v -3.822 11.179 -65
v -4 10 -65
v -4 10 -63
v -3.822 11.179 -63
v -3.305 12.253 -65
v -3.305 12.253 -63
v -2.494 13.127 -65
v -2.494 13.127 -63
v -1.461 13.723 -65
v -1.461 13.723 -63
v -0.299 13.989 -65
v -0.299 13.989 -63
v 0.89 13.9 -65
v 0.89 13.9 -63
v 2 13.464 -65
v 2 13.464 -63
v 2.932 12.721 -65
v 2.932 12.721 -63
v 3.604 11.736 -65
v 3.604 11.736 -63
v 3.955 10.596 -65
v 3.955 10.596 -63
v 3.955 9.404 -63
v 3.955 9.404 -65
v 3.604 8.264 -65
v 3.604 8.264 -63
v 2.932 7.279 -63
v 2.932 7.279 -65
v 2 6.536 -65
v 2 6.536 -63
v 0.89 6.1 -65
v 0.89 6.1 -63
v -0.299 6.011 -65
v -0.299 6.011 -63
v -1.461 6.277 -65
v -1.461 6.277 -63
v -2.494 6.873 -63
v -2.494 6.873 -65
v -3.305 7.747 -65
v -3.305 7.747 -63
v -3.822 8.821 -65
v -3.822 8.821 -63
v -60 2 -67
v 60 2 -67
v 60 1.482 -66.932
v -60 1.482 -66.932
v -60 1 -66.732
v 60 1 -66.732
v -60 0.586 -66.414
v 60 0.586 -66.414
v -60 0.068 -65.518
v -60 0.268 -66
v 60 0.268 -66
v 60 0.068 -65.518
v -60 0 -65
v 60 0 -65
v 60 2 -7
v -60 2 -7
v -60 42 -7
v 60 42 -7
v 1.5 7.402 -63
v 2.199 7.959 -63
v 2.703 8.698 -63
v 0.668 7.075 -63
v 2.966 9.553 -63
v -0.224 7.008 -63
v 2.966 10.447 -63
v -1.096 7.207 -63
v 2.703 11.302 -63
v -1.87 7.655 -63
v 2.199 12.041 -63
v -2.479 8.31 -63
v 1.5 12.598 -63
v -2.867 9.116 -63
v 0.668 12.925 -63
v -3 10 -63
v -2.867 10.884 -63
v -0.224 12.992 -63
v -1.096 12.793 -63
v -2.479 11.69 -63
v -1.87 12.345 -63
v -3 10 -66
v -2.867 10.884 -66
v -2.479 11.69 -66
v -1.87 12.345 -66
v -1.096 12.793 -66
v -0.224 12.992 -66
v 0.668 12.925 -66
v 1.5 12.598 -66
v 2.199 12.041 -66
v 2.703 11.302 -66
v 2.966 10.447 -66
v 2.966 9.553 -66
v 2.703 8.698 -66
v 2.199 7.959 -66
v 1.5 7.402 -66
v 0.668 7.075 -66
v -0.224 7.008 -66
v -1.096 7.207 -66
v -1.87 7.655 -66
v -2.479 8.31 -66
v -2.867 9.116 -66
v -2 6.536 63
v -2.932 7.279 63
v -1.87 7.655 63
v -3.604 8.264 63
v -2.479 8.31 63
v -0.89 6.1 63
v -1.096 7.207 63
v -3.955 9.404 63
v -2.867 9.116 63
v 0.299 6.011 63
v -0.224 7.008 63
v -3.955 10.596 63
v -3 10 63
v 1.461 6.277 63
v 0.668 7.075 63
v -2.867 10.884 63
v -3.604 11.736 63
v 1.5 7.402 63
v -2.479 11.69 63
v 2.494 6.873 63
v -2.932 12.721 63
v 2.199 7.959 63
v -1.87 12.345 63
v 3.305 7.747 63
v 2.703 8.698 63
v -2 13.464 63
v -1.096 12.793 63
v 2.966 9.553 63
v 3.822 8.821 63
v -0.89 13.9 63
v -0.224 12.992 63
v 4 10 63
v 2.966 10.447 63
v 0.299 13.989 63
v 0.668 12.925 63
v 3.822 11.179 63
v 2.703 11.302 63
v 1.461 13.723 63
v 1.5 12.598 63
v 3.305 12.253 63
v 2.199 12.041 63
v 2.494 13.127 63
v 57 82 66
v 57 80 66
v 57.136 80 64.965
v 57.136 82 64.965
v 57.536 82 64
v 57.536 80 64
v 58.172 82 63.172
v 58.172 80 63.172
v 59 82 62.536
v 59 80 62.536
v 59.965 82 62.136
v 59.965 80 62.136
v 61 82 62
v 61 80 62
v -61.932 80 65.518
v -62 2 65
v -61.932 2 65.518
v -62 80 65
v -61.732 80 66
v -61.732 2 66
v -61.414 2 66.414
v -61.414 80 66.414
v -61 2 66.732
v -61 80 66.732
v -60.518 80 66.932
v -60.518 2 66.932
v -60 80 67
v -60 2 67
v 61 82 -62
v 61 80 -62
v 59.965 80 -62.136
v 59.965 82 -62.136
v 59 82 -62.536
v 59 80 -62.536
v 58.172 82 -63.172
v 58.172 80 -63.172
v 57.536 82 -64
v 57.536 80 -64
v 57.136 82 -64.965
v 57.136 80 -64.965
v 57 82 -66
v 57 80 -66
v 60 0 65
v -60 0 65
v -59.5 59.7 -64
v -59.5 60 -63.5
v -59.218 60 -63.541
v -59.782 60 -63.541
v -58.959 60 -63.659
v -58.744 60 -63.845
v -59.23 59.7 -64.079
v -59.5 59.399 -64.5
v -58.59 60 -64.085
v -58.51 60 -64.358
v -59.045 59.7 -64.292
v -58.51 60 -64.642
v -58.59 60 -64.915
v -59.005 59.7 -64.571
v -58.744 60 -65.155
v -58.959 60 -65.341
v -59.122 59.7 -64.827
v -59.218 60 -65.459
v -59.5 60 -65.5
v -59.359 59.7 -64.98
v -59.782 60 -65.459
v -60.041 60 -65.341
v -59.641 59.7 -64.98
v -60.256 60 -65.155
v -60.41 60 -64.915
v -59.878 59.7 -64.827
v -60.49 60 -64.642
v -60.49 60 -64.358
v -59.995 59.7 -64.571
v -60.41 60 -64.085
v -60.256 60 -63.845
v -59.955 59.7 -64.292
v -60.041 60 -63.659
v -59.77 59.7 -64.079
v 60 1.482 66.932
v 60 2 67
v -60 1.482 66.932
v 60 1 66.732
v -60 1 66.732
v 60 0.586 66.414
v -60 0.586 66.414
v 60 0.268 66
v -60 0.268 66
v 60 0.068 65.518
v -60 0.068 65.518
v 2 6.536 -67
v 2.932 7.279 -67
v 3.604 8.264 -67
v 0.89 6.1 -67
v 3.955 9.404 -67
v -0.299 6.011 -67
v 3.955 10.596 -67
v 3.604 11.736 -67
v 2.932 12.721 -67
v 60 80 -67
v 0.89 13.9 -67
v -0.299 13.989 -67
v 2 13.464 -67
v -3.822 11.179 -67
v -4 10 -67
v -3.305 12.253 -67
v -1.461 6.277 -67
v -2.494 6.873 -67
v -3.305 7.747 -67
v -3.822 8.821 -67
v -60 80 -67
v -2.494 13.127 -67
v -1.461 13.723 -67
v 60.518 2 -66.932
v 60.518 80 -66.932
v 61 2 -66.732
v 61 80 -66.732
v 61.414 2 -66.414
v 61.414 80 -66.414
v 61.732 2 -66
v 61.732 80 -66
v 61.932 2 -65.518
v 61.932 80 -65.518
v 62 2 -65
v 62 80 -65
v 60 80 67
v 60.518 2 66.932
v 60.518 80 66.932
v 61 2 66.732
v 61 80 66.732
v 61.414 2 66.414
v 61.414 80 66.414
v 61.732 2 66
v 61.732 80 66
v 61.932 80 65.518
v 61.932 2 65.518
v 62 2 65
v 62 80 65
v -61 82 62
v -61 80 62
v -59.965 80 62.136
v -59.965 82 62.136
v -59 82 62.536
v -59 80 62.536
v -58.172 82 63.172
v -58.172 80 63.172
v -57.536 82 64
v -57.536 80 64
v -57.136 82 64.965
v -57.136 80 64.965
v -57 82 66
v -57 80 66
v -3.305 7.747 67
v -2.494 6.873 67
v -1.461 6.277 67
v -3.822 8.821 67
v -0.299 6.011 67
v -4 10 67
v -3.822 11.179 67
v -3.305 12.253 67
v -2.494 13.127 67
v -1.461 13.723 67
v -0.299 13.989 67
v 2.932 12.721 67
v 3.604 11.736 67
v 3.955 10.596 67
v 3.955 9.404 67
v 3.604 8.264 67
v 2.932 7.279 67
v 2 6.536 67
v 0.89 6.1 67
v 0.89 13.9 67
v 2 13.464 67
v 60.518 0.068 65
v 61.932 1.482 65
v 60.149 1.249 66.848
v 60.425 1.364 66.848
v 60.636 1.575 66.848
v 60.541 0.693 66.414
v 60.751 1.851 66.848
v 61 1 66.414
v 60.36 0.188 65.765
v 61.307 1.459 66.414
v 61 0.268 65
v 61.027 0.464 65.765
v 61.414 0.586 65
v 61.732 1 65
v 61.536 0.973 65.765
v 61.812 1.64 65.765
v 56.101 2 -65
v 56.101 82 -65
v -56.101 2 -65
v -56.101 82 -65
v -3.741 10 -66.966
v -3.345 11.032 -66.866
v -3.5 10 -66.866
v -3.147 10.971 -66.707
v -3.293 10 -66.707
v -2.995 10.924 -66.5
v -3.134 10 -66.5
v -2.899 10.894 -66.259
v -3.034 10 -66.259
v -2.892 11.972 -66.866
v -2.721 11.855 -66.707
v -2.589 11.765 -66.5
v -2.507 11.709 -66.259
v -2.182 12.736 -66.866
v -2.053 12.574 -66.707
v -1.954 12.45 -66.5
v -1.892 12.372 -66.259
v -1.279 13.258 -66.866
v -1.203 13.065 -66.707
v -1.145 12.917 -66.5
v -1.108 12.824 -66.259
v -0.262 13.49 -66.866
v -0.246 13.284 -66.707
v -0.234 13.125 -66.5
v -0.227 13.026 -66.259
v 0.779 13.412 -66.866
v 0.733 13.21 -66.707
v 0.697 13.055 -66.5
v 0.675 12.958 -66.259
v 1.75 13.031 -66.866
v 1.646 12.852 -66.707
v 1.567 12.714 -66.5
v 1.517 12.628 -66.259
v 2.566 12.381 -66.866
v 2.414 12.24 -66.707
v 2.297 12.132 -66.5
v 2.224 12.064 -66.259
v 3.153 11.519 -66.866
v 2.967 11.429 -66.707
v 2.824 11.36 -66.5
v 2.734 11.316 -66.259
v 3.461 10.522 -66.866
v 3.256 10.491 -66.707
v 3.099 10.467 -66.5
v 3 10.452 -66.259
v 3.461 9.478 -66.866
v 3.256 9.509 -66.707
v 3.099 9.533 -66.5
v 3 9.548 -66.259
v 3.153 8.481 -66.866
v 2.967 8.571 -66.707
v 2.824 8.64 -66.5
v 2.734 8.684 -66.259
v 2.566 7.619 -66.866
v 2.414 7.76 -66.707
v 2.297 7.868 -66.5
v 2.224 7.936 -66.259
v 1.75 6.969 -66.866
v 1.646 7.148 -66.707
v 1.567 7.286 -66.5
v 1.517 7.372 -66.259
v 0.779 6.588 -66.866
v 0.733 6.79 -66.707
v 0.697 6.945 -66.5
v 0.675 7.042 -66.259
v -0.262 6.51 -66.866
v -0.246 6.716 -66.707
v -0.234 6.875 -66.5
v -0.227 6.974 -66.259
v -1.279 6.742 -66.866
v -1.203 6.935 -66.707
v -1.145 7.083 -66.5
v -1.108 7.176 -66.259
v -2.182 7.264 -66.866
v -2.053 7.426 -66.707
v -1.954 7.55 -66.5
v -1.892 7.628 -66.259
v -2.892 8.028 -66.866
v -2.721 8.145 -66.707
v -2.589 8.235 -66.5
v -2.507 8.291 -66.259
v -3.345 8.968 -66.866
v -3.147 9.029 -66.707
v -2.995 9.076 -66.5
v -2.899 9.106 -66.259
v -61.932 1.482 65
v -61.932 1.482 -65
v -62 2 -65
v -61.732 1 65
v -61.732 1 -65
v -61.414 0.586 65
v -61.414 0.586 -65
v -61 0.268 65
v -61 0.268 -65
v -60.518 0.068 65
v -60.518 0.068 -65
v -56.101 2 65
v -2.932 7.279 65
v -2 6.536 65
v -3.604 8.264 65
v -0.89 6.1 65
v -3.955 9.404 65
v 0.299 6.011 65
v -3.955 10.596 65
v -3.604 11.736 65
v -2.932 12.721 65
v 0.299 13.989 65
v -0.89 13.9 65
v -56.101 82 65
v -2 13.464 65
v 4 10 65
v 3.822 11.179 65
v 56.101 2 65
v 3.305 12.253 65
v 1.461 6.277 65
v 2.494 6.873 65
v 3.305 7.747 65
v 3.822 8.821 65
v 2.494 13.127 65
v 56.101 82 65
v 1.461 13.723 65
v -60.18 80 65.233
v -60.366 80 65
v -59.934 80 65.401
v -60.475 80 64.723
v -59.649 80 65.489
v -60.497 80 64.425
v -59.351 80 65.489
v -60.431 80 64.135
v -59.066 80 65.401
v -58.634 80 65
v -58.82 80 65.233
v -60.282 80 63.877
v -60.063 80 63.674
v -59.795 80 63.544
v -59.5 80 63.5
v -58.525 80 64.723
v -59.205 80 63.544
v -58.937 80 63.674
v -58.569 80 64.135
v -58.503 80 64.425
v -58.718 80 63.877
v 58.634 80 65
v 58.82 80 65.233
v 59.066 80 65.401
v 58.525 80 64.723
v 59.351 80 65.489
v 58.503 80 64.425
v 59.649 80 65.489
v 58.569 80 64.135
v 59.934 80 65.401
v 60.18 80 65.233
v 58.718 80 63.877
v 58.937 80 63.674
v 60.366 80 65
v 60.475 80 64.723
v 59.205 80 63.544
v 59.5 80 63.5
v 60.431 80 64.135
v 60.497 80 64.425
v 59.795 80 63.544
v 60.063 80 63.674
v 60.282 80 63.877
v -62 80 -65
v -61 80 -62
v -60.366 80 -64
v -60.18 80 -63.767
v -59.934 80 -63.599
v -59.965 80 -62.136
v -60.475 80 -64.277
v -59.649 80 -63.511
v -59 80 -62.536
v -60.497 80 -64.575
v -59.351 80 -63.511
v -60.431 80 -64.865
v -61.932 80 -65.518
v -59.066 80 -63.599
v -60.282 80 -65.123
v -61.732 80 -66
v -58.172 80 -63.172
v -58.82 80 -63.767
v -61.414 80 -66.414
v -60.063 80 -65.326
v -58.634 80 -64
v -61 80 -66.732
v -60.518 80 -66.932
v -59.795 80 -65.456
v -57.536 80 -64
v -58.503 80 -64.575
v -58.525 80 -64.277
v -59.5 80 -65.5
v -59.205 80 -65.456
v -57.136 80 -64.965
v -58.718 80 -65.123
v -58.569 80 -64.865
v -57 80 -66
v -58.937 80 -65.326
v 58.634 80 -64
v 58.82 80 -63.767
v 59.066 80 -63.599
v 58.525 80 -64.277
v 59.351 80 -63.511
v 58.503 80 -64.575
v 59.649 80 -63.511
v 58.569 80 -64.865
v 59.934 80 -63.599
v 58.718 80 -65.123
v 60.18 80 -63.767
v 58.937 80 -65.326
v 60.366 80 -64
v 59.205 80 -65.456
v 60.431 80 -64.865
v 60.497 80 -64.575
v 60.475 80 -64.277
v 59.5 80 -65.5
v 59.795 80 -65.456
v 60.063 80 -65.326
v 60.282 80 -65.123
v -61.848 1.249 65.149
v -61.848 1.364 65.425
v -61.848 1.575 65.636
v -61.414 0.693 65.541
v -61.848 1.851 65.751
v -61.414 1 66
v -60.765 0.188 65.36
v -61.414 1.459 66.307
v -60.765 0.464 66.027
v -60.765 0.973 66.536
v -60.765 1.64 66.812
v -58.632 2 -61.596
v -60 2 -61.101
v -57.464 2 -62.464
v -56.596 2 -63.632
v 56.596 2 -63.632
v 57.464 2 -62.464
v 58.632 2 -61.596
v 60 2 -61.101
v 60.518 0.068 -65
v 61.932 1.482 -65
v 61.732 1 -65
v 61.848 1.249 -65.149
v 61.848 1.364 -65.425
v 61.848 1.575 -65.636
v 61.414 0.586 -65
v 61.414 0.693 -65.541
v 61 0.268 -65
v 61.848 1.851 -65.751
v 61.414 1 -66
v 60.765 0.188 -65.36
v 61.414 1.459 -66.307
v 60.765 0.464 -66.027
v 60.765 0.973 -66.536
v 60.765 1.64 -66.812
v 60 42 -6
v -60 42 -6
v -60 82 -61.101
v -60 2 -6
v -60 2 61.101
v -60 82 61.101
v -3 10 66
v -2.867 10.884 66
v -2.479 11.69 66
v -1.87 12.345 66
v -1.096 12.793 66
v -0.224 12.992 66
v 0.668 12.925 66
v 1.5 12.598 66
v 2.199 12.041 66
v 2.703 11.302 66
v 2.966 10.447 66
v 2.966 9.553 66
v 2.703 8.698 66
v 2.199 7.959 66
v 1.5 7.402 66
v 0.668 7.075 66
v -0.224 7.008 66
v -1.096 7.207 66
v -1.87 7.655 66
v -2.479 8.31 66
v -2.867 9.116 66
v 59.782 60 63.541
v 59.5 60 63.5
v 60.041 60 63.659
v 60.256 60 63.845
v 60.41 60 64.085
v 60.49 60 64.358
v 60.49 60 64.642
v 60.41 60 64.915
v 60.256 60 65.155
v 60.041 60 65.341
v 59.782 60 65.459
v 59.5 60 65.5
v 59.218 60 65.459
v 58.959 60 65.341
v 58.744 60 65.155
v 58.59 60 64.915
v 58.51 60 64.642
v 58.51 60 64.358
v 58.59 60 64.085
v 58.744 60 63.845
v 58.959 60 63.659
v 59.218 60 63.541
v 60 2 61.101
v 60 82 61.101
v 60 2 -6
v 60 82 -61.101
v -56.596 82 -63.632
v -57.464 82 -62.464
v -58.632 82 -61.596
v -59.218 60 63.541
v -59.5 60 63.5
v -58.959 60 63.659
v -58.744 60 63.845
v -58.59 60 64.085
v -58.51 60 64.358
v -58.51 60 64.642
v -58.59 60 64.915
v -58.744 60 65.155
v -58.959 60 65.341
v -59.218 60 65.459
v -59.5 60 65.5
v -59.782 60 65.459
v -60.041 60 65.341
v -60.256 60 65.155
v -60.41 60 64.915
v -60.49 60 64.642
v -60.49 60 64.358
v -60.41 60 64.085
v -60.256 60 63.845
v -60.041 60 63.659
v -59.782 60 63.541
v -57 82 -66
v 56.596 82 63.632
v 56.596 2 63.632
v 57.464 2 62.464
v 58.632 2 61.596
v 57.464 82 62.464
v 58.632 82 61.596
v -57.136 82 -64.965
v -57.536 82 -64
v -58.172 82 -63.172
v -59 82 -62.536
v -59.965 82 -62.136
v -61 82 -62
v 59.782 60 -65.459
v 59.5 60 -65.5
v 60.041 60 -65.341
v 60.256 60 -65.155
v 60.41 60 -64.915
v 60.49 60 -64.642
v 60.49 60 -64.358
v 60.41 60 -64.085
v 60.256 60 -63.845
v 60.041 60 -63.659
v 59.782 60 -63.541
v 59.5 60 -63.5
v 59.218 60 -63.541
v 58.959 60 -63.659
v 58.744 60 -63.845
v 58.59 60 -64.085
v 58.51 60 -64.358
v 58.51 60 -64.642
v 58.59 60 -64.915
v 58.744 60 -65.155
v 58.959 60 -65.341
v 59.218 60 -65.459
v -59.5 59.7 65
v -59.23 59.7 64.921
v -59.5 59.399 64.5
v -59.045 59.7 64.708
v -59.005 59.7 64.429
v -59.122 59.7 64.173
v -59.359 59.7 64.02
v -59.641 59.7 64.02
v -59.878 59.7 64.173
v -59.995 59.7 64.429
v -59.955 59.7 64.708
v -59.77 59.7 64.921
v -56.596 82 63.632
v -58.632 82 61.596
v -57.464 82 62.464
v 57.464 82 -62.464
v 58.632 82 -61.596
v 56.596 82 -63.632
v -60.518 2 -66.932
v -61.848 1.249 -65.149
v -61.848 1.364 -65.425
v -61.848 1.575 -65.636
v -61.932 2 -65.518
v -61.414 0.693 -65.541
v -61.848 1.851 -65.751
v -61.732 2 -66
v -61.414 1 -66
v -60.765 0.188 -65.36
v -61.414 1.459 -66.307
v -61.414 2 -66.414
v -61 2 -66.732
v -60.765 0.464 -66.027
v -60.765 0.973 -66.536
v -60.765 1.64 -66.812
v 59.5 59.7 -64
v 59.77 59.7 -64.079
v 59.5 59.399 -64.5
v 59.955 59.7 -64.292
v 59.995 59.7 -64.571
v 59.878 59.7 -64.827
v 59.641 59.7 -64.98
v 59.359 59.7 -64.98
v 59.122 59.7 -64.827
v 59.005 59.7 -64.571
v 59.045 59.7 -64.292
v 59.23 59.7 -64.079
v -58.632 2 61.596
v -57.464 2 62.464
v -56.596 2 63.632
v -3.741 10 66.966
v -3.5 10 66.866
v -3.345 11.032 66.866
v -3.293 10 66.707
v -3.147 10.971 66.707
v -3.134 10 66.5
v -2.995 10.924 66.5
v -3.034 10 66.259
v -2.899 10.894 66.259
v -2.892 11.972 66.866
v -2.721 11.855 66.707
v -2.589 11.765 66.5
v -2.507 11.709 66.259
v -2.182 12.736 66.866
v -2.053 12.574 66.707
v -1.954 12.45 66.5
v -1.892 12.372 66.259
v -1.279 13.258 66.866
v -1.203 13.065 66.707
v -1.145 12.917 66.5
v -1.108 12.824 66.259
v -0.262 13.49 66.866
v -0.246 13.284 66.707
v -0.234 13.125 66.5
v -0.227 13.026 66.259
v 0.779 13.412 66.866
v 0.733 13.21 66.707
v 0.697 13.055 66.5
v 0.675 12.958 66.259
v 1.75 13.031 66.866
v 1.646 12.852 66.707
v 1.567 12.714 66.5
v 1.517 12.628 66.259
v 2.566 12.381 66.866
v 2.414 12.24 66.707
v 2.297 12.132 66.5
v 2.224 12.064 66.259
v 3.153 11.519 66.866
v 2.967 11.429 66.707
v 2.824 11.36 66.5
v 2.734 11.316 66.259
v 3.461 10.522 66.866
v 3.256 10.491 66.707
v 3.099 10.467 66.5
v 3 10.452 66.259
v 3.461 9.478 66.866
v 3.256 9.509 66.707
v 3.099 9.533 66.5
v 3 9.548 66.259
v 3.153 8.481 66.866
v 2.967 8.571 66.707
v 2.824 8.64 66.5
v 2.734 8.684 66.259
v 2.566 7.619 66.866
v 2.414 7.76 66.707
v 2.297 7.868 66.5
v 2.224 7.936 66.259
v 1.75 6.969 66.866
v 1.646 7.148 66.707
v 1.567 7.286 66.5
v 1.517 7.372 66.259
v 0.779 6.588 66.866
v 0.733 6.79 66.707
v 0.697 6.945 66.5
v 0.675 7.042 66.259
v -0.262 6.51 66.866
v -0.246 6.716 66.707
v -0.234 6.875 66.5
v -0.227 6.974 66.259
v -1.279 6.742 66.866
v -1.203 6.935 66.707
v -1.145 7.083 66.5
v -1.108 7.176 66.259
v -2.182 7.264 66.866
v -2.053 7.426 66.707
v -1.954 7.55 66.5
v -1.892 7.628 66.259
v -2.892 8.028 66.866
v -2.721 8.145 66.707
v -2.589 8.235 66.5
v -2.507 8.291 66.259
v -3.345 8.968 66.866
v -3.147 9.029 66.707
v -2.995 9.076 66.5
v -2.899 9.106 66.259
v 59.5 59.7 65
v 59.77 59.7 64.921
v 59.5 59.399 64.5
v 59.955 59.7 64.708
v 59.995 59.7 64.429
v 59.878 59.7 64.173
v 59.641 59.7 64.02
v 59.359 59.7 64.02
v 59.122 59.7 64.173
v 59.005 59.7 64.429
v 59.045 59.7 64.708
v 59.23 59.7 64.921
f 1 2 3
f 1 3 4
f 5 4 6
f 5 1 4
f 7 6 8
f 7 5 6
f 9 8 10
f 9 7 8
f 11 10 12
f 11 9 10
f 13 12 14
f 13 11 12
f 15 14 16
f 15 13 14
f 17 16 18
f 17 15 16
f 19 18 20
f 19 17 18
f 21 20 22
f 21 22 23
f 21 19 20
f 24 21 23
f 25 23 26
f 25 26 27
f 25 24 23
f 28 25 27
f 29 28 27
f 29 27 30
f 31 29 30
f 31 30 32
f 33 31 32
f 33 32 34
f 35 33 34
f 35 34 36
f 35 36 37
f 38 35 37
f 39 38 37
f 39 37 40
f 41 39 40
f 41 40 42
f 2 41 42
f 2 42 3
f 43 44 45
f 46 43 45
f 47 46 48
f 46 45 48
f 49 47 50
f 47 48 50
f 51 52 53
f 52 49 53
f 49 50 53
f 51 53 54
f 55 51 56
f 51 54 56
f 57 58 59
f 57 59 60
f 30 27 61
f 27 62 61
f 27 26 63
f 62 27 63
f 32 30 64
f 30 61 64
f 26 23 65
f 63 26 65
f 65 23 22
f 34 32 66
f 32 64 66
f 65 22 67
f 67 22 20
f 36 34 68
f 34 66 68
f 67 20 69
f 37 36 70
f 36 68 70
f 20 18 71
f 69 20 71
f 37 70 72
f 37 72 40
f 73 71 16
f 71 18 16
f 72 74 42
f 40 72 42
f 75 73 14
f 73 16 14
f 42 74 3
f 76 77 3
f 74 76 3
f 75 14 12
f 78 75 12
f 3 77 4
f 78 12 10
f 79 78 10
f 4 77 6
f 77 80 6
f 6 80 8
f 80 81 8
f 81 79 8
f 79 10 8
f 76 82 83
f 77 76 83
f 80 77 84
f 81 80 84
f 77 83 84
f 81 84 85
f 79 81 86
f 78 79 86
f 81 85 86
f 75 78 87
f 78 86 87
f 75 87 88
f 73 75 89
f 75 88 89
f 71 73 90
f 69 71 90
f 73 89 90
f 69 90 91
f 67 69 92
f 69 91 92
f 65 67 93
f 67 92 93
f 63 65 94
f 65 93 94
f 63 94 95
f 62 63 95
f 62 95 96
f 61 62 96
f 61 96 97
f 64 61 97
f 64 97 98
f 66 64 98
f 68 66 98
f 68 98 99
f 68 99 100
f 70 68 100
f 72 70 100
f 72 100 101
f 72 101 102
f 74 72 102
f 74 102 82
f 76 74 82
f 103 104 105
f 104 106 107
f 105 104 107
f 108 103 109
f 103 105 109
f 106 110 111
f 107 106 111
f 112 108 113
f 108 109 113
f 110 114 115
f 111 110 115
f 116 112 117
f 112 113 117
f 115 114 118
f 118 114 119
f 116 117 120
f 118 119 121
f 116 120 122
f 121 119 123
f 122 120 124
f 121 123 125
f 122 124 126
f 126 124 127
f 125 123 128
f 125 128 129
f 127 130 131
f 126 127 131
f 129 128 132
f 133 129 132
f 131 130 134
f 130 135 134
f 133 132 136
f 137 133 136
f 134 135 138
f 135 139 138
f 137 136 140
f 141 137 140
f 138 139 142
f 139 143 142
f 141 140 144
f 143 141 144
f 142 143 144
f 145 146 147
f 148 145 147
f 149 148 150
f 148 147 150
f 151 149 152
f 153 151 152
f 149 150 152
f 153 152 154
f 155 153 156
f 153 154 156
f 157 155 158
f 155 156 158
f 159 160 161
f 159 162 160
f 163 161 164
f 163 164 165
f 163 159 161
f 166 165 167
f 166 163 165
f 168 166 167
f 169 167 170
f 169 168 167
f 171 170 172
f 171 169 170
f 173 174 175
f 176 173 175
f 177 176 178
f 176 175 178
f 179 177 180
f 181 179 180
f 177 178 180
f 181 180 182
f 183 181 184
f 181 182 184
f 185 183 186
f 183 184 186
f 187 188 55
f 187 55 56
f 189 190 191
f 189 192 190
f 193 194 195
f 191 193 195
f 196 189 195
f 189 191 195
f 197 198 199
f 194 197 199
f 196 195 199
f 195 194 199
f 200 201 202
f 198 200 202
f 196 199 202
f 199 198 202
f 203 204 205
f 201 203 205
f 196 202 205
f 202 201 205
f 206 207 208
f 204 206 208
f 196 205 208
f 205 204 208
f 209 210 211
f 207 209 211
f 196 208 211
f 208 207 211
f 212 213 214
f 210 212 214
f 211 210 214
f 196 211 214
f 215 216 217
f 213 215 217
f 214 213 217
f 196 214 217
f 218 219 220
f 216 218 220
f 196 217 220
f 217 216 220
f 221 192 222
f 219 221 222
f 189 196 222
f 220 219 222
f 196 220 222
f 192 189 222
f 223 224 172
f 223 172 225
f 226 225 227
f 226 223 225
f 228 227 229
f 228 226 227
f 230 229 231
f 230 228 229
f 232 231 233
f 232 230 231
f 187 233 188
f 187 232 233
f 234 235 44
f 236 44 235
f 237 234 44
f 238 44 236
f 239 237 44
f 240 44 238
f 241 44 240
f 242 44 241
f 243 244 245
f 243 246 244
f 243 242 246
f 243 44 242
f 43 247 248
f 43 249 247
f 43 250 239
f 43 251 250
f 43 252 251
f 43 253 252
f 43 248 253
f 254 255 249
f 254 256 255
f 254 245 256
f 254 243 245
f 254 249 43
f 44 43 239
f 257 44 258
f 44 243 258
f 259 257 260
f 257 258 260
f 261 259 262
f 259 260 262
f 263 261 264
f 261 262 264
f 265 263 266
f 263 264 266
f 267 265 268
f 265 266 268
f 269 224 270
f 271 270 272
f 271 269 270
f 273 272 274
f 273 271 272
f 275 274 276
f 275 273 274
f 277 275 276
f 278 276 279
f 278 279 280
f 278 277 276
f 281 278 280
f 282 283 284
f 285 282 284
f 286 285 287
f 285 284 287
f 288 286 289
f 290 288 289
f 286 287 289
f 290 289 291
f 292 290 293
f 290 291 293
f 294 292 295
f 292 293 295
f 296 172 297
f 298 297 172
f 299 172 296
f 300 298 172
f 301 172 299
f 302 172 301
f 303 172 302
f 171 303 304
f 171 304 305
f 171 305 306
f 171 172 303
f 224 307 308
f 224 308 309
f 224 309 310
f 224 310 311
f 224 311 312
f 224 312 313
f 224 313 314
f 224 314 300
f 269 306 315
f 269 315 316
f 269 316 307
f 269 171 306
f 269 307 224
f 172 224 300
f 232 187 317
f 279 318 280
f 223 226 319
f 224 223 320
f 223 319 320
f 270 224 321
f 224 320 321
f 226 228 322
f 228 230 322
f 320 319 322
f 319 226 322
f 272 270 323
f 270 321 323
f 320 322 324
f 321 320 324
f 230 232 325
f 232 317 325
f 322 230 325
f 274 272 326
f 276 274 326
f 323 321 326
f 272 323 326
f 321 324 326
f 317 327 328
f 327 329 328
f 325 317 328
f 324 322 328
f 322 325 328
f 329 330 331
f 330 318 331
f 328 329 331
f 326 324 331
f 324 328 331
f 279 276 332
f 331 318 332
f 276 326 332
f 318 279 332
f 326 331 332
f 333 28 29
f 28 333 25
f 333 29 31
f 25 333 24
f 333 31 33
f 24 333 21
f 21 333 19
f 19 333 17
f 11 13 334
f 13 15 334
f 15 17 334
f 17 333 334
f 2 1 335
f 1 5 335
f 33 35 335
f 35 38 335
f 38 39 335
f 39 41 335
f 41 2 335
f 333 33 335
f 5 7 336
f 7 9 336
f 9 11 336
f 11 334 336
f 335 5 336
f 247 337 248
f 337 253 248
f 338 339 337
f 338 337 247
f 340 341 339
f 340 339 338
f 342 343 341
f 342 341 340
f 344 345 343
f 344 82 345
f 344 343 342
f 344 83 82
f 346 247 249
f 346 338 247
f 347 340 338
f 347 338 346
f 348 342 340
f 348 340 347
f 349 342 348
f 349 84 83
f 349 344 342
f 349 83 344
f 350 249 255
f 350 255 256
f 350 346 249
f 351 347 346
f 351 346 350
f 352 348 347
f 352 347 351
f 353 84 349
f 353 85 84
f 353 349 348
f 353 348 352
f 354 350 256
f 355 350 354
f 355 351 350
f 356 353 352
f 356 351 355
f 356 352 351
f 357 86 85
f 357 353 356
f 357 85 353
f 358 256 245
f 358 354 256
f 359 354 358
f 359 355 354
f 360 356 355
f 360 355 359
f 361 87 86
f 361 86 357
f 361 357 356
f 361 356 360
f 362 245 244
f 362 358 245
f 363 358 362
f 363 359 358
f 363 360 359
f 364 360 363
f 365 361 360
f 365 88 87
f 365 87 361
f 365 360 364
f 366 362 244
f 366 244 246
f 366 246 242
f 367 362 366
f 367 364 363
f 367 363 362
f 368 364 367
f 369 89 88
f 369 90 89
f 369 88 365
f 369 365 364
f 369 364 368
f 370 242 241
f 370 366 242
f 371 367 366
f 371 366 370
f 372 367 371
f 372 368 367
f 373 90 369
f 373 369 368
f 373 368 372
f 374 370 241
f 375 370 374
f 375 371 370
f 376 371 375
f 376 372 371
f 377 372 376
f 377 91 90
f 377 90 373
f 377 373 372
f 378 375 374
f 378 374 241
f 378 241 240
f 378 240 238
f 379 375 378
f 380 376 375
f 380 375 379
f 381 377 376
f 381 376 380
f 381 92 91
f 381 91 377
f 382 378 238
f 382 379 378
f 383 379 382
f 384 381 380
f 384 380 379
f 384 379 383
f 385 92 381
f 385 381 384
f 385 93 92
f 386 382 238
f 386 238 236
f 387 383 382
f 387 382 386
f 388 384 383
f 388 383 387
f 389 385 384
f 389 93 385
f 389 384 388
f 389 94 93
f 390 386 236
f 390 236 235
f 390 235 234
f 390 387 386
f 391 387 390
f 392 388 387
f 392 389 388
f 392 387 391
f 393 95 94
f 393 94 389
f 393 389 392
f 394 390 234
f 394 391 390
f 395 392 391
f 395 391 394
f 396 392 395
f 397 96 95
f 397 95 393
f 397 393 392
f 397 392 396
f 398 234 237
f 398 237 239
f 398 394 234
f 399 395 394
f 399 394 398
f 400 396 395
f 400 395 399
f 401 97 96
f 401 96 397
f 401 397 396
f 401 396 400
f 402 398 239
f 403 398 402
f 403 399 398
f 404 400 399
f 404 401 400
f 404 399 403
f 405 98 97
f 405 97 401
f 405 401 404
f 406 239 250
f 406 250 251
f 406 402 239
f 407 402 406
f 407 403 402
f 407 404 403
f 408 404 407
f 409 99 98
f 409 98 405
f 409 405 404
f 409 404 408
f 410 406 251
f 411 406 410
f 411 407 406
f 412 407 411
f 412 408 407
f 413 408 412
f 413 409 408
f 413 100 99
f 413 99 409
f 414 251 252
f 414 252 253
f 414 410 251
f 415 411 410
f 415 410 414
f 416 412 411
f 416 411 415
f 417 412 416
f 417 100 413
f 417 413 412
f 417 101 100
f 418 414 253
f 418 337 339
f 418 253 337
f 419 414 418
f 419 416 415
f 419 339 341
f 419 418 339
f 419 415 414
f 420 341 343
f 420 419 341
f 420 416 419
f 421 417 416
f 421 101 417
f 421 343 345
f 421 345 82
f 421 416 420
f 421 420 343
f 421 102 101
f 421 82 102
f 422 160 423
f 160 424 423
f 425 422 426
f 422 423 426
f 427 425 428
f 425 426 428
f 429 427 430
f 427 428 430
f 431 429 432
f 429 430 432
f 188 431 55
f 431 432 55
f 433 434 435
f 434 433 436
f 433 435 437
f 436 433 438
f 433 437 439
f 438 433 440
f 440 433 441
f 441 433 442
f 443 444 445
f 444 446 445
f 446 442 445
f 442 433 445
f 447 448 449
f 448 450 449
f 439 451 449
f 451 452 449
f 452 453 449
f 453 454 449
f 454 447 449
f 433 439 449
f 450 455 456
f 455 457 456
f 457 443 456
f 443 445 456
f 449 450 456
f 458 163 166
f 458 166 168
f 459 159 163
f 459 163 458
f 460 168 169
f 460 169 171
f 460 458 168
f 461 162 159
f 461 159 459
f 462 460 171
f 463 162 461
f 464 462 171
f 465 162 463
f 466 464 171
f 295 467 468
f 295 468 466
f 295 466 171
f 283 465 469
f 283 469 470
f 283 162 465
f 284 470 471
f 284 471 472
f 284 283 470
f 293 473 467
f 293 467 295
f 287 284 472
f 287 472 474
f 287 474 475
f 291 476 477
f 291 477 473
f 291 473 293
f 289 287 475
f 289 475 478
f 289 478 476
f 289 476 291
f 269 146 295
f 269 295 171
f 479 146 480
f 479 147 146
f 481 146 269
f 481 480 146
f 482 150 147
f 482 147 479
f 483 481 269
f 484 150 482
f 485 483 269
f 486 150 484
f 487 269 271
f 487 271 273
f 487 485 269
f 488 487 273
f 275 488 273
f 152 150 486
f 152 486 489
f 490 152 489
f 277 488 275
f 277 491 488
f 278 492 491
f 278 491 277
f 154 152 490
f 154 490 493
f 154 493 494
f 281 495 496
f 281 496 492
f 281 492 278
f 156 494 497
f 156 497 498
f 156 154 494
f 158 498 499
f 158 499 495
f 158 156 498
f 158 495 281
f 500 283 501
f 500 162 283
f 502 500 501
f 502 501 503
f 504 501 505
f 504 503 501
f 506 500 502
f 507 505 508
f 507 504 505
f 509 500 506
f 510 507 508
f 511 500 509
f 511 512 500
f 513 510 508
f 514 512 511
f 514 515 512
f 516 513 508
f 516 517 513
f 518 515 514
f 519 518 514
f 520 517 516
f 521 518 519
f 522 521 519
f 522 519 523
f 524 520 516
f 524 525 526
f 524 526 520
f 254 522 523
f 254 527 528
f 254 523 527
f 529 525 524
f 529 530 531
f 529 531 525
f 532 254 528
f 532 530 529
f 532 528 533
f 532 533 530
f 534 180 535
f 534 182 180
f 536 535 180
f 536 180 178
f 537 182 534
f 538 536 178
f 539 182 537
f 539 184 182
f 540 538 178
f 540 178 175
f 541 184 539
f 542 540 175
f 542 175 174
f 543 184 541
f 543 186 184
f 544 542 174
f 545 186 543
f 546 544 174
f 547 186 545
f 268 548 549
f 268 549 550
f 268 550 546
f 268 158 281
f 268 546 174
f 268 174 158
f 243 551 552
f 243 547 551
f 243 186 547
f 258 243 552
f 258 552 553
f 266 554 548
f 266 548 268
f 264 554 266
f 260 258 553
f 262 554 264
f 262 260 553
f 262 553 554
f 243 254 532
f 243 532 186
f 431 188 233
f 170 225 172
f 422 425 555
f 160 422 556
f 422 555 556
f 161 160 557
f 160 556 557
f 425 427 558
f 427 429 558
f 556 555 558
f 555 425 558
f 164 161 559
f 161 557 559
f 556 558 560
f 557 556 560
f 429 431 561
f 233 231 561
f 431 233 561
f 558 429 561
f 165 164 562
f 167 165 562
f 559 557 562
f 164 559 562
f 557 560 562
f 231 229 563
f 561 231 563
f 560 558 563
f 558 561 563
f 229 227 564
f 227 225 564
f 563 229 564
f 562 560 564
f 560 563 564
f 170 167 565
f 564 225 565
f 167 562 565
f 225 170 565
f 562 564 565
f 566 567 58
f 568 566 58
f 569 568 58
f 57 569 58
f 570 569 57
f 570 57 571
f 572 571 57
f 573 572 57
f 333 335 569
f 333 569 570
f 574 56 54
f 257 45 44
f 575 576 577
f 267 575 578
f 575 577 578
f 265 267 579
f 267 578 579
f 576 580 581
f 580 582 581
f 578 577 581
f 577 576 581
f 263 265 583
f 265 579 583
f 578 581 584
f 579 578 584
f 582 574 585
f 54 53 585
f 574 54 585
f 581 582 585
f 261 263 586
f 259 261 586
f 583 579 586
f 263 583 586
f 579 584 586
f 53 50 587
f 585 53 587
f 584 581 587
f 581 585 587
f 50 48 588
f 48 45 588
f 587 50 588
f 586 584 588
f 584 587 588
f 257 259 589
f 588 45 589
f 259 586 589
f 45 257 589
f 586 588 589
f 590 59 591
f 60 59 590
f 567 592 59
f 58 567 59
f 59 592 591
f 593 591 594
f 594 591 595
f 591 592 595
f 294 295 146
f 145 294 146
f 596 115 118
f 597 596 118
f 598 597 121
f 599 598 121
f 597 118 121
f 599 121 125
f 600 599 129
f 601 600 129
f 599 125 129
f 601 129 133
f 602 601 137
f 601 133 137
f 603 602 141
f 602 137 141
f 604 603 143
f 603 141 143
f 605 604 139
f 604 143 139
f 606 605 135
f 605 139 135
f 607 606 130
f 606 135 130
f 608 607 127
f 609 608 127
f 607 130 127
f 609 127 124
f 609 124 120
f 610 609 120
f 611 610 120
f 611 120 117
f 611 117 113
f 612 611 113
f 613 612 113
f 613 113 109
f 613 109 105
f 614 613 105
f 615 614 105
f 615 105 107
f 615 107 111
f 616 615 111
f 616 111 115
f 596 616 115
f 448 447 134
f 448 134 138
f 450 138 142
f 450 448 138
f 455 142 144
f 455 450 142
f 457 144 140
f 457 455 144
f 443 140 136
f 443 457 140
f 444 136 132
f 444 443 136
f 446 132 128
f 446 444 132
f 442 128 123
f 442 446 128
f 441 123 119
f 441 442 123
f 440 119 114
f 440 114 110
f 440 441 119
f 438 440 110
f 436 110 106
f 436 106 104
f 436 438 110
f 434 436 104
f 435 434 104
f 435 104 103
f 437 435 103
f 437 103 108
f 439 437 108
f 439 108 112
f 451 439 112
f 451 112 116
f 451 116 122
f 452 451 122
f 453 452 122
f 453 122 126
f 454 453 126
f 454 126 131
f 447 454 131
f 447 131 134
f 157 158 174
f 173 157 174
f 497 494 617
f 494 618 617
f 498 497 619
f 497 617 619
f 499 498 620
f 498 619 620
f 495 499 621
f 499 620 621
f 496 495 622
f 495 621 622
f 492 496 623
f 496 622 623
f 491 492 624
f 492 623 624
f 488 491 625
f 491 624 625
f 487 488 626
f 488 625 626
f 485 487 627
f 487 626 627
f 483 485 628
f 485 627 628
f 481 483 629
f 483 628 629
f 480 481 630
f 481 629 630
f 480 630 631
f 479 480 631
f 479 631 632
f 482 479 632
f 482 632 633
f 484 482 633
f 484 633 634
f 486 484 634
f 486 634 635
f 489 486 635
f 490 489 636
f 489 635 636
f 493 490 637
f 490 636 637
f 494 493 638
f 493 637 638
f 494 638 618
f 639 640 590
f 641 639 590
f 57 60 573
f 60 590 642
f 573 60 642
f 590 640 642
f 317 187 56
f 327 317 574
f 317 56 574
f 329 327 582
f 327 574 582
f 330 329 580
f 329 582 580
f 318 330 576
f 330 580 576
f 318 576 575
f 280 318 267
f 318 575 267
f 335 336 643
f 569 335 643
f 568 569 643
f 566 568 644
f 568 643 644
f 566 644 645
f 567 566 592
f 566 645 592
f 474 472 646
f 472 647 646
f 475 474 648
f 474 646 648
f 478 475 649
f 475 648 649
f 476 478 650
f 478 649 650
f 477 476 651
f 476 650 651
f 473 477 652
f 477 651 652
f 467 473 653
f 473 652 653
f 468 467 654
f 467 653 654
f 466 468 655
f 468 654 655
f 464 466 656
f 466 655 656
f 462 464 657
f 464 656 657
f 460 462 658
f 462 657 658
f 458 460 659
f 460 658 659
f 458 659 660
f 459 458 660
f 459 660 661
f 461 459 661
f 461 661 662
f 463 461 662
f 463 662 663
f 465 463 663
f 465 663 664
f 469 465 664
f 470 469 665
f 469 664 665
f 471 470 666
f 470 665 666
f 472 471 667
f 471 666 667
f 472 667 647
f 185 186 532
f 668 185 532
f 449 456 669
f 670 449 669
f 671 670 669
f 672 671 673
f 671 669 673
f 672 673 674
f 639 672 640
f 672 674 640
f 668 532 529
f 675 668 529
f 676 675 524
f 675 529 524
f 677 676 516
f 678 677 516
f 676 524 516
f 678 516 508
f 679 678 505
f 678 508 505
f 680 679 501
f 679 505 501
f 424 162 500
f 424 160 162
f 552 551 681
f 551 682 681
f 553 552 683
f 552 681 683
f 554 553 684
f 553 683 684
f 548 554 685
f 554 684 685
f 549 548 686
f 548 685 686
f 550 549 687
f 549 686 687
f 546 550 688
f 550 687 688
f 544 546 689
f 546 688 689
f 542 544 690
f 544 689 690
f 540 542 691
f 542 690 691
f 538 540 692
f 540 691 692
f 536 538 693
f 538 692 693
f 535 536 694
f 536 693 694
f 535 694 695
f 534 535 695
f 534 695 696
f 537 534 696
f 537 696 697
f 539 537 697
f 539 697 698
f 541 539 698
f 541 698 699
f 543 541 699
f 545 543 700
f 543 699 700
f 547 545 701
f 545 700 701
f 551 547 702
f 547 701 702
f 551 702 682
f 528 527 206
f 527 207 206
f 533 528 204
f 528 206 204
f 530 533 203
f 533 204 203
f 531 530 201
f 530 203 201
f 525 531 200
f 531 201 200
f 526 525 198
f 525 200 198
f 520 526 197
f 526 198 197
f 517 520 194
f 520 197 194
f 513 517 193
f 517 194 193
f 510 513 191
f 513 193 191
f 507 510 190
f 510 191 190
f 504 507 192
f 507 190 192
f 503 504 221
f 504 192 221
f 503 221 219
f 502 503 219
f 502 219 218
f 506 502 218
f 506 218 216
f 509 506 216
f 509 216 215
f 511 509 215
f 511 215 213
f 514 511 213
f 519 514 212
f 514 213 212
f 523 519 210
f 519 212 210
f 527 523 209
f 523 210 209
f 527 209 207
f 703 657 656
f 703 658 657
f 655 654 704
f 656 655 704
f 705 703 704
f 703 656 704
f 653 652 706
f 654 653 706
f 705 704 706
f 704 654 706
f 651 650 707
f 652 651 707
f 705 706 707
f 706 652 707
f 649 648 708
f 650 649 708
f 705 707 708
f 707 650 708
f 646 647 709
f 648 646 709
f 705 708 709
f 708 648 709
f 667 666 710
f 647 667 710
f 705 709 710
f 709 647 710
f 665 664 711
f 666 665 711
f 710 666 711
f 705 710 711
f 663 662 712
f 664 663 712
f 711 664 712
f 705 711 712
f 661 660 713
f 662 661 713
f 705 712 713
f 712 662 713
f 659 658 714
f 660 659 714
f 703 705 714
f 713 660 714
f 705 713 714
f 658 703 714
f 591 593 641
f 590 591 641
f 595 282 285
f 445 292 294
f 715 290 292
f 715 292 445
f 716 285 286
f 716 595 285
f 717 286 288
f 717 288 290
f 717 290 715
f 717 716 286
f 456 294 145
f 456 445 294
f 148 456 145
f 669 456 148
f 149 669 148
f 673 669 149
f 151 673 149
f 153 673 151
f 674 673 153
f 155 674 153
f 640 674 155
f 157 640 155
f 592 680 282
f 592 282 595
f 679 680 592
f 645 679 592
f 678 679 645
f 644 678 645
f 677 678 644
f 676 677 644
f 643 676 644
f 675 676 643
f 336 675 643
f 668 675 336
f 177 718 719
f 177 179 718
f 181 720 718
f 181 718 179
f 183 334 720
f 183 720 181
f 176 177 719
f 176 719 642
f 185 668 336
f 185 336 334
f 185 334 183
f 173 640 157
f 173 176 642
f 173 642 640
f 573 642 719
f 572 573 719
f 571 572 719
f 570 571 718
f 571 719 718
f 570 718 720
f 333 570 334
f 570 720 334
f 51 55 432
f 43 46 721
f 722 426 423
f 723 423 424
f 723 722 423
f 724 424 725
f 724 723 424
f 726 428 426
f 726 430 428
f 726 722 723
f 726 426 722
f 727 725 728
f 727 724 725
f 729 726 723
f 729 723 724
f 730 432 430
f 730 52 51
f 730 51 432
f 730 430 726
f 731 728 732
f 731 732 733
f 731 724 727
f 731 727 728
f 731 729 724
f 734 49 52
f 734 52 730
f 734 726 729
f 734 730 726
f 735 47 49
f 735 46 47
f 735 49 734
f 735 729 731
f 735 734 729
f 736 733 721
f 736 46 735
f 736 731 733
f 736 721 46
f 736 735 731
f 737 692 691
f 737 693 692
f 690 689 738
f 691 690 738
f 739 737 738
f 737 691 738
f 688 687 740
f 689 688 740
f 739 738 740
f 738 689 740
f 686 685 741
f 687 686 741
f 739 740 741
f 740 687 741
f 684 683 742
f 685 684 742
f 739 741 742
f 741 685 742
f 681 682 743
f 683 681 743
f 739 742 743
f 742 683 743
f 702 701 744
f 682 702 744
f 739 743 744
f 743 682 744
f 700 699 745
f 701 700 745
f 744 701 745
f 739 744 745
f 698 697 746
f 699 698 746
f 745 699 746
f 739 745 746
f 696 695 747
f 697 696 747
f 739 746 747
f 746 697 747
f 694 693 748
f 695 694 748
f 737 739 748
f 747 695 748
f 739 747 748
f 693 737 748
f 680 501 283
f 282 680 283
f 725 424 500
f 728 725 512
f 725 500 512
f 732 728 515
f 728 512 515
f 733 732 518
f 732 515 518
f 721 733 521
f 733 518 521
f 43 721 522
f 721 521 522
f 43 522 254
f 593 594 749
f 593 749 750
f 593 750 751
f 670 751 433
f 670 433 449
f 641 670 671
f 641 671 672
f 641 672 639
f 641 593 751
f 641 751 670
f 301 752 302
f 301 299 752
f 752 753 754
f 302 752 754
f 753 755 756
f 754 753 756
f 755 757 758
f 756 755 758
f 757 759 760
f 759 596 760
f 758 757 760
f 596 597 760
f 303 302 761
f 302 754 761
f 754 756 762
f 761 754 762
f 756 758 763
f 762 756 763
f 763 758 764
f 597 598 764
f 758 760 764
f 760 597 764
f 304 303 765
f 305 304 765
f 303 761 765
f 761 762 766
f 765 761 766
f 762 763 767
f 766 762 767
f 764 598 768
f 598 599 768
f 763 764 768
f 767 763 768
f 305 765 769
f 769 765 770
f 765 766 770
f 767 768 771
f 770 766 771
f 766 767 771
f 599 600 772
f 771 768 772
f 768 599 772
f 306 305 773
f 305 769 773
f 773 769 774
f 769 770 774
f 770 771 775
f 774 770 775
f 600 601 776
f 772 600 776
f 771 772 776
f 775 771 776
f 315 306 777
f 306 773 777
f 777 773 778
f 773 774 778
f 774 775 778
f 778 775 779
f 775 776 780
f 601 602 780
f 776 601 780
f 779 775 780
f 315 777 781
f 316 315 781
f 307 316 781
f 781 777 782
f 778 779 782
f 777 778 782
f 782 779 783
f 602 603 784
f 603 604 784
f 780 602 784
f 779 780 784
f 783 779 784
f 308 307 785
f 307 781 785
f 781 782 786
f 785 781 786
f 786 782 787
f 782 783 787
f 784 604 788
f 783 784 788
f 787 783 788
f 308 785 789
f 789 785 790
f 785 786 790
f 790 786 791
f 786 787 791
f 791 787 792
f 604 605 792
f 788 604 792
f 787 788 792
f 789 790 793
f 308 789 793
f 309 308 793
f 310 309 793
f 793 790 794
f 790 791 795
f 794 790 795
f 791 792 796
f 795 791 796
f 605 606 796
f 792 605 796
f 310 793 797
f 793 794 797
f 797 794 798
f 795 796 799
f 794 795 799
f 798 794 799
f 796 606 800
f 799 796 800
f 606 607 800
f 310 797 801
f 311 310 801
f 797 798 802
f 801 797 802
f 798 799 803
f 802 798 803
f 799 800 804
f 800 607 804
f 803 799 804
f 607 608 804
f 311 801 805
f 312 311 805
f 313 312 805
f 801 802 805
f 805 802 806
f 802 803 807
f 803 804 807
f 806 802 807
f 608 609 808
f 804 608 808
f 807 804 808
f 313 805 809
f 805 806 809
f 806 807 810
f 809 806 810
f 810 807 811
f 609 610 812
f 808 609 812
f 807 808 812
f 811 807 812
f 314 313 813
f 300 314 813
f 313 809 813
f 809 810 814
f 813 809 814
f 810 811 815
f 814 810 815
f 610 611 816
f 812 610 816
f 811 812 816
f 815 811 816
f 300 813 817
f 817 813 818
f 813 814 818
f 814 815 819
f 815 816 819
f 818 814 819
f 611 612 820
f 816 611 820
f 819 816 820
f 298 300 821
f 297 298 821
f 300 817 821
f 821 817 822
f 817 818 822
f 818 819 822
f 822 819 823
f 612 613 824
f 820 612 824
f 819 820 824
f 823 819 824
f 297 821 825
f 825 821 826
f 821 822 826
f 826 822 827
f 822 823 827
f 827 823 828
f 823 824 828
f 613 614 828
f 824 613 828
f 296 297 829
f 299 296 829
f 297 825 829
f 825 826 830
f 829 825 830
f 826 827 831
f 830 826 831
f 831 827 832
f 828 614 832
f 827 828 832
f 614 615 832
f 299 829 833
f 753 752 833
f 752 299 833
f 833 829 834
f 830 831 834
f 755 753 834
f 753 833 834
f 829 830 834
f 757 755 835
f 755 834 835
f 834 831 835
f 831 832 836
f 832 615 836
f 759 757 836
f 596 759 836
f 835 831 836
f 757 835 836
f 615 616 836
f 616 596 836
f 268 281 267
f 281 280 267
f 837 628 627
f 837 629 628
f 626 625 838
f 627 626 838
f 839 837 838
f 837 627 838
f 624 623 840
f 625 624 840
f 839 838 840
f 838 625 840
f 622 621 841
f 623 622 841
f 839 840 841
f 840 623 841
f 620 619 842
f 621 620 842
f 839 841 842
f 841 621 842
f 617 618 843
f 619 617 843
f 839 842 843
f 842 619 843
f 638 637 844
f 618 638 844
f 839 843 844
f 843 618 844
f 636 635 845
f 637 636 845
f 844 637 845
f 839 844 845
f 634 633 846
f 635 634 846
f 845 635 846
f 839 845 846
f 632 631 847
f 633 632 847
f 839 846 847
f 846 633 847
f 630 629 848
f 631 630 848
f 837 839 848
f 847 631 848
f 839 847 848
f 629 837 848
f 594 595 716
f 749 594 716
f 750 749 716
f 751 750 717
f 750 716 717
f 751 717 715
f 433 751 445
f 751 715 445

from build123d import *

# Parameters (mm, degrees)
SKETCH1_W                 = 124
SKETCH1_H                 = 134
BOSS_EXTRUDE1_DEPTH       = 80
BOSS_EXTRUDE2_DEPTH       = 2
CUT_EXTRUDE3_DEPTH        = 80
FILLET1_R                 = 2
SKETCH5_R                 = 4
BOSS_EXTRUDE4_DEPTH       = 4
SKETCH9_R                 = 4
BOSS_EXTRUDE5_DEPTH       = 4
SKETCH10_R                = 3
CUT_EXTRUDE5_DEPTH        = 1
CUT_EXTRUDE5_DEPTH_BACK   = 135
FILLET3_R                 = 1
F_2_0MM_DOWEL_HOLE1_D     = 2
F_2_0MM_DOWEL_HOLE1_DEPTH = 20
F_2_0MM_DOWEL_HOLE1_TIP   = 0.600860619
SKETCH14_W                = 120
SKETCH14_H                = 1
BOSS_EXTRUDE6_DEPTH       = 40


with BuildPart() as part:
    # Sketch1 → Boss-Extrude1 (new body)
    with BuildSketch(Plane(origin=(0, 0, 0), x_dir=(1, 0, 0), z_dir=(0, 1, 0))):
        Rectangle(SKETCH1_W, SKETCH1_H)
    extrude(amount=BOSS_EXTRUDE1_DEPTH)

    # Sketch2 → Boss-Extrude2 (add)
    with BuildSketch(Plane(origin=(0, 80, 0), x_dir=(1, 0, 0), z_dir=(0, 1, 0))):
        with BuildLine():
            Line((57, 66), (-57, 66))
            ThreePointArc((-57, 66), (-58.171572875, 63.171572875), (-61, 62))
            Line((-61, 62), (-61, -62))
            ThreePointArc((-61, -62), (-58.171572875, -63.171572875), (-57, -66))
            Line((-57, -66), (57, -66))
            ThreePointArc((57, -66), (58.171572875, -63.171572875), (61, -62))
            Line((61, -62), (61, 62))
            ThreePointArc((61, 62), (58.171572875, 63.171572875), (57, 66))
        make_face()
    extrude(amount=BOSS_EXTRUDE2_DEPTH)

    # Sketch3 → Cut-Extrude3 (cut)
    with BuildSketch(Plane(origin=(0, 82, 0), x_dir=(1, 0, 0), z_dir=(0, 1, 0))):
        with BuildLine():
            Line((56.101020514, 65), (-56.101020514, 65))
            ThreePointArc((-56.101020514, 65), (-57.464466094, 62.464466094), (-60, 61.101020514))
            Line((-60, 61.101020514), (-60, -61.101020514))
            ThreePointArc((-60, -61.101020514), (-57.464466094, -62.464466094), (-56.101020514, -65))
            Line((-56.101020514, -65), (56.101020514, -65))
            ThreePointArc((56.101020514, -65), (57.464466094, -62.464466094), (60, -61.101020514))
            Line((60, -61.101020514), (60, 61.101020514))
            ThreePointArc((60, 61.101020514), (57.464466094, 62.464466094), (56.101020514, 65))
        make_face()
    extrude(amount=-CUT_EXTRUDE3_DEPTH, mode=Mode.SUBTRACT)

    # Fillet1
    fillet1_edges = [part.edges().sort_by_distance(p)[0] for p in [
        (0, 0, -67),
        (62, 0, 0),
        (0, 0, 67),
        (-62, 0, 0),
        (-62, 40, -67),
        (62, 40, -67),
        (62, 40, 67),
        (-62, 40, 67),
    ]]
    fillet(fillet1_edges, radius=FILLET1_R)

    # Sketch5 → Boss-Extrude4 (add)
    with BuildSketch(Plane.XY.offset(67)):
        with Locations((0, 10)):
            Circle(SKETCH5_R)
    extrude(amount=-BOSS_EXTRUDE4_DEPTH)

    # Sketch9 → Boss-Extrude5 (add)
    with BuildSketch(Plane(origin=(0, 0, -67), x_dir=(-1, 0, 0), z_dir=(0, 0, -1))):
        with Locations((0, 10)):
            Circle(SKETCH9_R)
    extrude(amount=-BOSS_EXTRUDE5_DEPTH)

    # Sketch10 → Cut-Extrude5 (cut, two sides)
    with BuildSketch(Plane(origin=(0, 0, -67), x_dir=(-1, 0, 0), z_dir=(0, 0, -1))) as cut_extrude5_sk:
        with Locations((0, 10)):
            Circle(SKETCH10_R)
    extrude(amount=CUT_EXTRUDE5_DEPTH, mode=Mode.SUBTRACT)
    extrude(cut_extrude5_sk.sketch, amount=-CUT_EXTRUDE5_DEPTH_BACK, mode=Mode.SUBTRACT)

    # Fillet3
    fillet3_edges = [part.edges().sort_by_distance(p)[0] for p in [
        (3, 10, -67),
        (3, 10, 67),
    ]]
    fillet(fillet3_edges, radius=FILLET3_R)

    # Ø2.0mm Dowel Hole1
    with Locations(Plane(origin=(59.5, 80, -64.5), x_dir=(0, 0, 1), z_dir=(0, 1, 0))):
        with Locations((0, 0), (129, 0), (129, -119), (0, -119)):
            Hole(F_2_0MM_DOWEL_HOLE1_D / 2, depth=F_2_0MM_DOWEL_HOLE1_DEPTH)
            with Locations((0, 0, -(F_2_0MM_DOWEL_HOLE1_DEPTH + F_2_0MM_DOWEL_HOLE1_TIP / 2))):  # 118° drill point
                Cone(0, F_2_0MM_DOWEL_HOLE1_D / 2, F_2_0MM_DOWEL_HOLE1_TIP, mode=Mode.SUBTRACT)

    # Sketch14 → Boss-Extrude6 (add)
    with BuildSketch(Plane(origin=(0, 2, 0), x_dir=(1, 0, 0), z_dir=(0, 1, 0))):
        with Locations((0, 6.5)):
            Rectangle(SKETCH14_W, SKETCH14_H)
    extrude(amount=BOSS_EXTRUDE6_DEPTH)


solid = part.part
